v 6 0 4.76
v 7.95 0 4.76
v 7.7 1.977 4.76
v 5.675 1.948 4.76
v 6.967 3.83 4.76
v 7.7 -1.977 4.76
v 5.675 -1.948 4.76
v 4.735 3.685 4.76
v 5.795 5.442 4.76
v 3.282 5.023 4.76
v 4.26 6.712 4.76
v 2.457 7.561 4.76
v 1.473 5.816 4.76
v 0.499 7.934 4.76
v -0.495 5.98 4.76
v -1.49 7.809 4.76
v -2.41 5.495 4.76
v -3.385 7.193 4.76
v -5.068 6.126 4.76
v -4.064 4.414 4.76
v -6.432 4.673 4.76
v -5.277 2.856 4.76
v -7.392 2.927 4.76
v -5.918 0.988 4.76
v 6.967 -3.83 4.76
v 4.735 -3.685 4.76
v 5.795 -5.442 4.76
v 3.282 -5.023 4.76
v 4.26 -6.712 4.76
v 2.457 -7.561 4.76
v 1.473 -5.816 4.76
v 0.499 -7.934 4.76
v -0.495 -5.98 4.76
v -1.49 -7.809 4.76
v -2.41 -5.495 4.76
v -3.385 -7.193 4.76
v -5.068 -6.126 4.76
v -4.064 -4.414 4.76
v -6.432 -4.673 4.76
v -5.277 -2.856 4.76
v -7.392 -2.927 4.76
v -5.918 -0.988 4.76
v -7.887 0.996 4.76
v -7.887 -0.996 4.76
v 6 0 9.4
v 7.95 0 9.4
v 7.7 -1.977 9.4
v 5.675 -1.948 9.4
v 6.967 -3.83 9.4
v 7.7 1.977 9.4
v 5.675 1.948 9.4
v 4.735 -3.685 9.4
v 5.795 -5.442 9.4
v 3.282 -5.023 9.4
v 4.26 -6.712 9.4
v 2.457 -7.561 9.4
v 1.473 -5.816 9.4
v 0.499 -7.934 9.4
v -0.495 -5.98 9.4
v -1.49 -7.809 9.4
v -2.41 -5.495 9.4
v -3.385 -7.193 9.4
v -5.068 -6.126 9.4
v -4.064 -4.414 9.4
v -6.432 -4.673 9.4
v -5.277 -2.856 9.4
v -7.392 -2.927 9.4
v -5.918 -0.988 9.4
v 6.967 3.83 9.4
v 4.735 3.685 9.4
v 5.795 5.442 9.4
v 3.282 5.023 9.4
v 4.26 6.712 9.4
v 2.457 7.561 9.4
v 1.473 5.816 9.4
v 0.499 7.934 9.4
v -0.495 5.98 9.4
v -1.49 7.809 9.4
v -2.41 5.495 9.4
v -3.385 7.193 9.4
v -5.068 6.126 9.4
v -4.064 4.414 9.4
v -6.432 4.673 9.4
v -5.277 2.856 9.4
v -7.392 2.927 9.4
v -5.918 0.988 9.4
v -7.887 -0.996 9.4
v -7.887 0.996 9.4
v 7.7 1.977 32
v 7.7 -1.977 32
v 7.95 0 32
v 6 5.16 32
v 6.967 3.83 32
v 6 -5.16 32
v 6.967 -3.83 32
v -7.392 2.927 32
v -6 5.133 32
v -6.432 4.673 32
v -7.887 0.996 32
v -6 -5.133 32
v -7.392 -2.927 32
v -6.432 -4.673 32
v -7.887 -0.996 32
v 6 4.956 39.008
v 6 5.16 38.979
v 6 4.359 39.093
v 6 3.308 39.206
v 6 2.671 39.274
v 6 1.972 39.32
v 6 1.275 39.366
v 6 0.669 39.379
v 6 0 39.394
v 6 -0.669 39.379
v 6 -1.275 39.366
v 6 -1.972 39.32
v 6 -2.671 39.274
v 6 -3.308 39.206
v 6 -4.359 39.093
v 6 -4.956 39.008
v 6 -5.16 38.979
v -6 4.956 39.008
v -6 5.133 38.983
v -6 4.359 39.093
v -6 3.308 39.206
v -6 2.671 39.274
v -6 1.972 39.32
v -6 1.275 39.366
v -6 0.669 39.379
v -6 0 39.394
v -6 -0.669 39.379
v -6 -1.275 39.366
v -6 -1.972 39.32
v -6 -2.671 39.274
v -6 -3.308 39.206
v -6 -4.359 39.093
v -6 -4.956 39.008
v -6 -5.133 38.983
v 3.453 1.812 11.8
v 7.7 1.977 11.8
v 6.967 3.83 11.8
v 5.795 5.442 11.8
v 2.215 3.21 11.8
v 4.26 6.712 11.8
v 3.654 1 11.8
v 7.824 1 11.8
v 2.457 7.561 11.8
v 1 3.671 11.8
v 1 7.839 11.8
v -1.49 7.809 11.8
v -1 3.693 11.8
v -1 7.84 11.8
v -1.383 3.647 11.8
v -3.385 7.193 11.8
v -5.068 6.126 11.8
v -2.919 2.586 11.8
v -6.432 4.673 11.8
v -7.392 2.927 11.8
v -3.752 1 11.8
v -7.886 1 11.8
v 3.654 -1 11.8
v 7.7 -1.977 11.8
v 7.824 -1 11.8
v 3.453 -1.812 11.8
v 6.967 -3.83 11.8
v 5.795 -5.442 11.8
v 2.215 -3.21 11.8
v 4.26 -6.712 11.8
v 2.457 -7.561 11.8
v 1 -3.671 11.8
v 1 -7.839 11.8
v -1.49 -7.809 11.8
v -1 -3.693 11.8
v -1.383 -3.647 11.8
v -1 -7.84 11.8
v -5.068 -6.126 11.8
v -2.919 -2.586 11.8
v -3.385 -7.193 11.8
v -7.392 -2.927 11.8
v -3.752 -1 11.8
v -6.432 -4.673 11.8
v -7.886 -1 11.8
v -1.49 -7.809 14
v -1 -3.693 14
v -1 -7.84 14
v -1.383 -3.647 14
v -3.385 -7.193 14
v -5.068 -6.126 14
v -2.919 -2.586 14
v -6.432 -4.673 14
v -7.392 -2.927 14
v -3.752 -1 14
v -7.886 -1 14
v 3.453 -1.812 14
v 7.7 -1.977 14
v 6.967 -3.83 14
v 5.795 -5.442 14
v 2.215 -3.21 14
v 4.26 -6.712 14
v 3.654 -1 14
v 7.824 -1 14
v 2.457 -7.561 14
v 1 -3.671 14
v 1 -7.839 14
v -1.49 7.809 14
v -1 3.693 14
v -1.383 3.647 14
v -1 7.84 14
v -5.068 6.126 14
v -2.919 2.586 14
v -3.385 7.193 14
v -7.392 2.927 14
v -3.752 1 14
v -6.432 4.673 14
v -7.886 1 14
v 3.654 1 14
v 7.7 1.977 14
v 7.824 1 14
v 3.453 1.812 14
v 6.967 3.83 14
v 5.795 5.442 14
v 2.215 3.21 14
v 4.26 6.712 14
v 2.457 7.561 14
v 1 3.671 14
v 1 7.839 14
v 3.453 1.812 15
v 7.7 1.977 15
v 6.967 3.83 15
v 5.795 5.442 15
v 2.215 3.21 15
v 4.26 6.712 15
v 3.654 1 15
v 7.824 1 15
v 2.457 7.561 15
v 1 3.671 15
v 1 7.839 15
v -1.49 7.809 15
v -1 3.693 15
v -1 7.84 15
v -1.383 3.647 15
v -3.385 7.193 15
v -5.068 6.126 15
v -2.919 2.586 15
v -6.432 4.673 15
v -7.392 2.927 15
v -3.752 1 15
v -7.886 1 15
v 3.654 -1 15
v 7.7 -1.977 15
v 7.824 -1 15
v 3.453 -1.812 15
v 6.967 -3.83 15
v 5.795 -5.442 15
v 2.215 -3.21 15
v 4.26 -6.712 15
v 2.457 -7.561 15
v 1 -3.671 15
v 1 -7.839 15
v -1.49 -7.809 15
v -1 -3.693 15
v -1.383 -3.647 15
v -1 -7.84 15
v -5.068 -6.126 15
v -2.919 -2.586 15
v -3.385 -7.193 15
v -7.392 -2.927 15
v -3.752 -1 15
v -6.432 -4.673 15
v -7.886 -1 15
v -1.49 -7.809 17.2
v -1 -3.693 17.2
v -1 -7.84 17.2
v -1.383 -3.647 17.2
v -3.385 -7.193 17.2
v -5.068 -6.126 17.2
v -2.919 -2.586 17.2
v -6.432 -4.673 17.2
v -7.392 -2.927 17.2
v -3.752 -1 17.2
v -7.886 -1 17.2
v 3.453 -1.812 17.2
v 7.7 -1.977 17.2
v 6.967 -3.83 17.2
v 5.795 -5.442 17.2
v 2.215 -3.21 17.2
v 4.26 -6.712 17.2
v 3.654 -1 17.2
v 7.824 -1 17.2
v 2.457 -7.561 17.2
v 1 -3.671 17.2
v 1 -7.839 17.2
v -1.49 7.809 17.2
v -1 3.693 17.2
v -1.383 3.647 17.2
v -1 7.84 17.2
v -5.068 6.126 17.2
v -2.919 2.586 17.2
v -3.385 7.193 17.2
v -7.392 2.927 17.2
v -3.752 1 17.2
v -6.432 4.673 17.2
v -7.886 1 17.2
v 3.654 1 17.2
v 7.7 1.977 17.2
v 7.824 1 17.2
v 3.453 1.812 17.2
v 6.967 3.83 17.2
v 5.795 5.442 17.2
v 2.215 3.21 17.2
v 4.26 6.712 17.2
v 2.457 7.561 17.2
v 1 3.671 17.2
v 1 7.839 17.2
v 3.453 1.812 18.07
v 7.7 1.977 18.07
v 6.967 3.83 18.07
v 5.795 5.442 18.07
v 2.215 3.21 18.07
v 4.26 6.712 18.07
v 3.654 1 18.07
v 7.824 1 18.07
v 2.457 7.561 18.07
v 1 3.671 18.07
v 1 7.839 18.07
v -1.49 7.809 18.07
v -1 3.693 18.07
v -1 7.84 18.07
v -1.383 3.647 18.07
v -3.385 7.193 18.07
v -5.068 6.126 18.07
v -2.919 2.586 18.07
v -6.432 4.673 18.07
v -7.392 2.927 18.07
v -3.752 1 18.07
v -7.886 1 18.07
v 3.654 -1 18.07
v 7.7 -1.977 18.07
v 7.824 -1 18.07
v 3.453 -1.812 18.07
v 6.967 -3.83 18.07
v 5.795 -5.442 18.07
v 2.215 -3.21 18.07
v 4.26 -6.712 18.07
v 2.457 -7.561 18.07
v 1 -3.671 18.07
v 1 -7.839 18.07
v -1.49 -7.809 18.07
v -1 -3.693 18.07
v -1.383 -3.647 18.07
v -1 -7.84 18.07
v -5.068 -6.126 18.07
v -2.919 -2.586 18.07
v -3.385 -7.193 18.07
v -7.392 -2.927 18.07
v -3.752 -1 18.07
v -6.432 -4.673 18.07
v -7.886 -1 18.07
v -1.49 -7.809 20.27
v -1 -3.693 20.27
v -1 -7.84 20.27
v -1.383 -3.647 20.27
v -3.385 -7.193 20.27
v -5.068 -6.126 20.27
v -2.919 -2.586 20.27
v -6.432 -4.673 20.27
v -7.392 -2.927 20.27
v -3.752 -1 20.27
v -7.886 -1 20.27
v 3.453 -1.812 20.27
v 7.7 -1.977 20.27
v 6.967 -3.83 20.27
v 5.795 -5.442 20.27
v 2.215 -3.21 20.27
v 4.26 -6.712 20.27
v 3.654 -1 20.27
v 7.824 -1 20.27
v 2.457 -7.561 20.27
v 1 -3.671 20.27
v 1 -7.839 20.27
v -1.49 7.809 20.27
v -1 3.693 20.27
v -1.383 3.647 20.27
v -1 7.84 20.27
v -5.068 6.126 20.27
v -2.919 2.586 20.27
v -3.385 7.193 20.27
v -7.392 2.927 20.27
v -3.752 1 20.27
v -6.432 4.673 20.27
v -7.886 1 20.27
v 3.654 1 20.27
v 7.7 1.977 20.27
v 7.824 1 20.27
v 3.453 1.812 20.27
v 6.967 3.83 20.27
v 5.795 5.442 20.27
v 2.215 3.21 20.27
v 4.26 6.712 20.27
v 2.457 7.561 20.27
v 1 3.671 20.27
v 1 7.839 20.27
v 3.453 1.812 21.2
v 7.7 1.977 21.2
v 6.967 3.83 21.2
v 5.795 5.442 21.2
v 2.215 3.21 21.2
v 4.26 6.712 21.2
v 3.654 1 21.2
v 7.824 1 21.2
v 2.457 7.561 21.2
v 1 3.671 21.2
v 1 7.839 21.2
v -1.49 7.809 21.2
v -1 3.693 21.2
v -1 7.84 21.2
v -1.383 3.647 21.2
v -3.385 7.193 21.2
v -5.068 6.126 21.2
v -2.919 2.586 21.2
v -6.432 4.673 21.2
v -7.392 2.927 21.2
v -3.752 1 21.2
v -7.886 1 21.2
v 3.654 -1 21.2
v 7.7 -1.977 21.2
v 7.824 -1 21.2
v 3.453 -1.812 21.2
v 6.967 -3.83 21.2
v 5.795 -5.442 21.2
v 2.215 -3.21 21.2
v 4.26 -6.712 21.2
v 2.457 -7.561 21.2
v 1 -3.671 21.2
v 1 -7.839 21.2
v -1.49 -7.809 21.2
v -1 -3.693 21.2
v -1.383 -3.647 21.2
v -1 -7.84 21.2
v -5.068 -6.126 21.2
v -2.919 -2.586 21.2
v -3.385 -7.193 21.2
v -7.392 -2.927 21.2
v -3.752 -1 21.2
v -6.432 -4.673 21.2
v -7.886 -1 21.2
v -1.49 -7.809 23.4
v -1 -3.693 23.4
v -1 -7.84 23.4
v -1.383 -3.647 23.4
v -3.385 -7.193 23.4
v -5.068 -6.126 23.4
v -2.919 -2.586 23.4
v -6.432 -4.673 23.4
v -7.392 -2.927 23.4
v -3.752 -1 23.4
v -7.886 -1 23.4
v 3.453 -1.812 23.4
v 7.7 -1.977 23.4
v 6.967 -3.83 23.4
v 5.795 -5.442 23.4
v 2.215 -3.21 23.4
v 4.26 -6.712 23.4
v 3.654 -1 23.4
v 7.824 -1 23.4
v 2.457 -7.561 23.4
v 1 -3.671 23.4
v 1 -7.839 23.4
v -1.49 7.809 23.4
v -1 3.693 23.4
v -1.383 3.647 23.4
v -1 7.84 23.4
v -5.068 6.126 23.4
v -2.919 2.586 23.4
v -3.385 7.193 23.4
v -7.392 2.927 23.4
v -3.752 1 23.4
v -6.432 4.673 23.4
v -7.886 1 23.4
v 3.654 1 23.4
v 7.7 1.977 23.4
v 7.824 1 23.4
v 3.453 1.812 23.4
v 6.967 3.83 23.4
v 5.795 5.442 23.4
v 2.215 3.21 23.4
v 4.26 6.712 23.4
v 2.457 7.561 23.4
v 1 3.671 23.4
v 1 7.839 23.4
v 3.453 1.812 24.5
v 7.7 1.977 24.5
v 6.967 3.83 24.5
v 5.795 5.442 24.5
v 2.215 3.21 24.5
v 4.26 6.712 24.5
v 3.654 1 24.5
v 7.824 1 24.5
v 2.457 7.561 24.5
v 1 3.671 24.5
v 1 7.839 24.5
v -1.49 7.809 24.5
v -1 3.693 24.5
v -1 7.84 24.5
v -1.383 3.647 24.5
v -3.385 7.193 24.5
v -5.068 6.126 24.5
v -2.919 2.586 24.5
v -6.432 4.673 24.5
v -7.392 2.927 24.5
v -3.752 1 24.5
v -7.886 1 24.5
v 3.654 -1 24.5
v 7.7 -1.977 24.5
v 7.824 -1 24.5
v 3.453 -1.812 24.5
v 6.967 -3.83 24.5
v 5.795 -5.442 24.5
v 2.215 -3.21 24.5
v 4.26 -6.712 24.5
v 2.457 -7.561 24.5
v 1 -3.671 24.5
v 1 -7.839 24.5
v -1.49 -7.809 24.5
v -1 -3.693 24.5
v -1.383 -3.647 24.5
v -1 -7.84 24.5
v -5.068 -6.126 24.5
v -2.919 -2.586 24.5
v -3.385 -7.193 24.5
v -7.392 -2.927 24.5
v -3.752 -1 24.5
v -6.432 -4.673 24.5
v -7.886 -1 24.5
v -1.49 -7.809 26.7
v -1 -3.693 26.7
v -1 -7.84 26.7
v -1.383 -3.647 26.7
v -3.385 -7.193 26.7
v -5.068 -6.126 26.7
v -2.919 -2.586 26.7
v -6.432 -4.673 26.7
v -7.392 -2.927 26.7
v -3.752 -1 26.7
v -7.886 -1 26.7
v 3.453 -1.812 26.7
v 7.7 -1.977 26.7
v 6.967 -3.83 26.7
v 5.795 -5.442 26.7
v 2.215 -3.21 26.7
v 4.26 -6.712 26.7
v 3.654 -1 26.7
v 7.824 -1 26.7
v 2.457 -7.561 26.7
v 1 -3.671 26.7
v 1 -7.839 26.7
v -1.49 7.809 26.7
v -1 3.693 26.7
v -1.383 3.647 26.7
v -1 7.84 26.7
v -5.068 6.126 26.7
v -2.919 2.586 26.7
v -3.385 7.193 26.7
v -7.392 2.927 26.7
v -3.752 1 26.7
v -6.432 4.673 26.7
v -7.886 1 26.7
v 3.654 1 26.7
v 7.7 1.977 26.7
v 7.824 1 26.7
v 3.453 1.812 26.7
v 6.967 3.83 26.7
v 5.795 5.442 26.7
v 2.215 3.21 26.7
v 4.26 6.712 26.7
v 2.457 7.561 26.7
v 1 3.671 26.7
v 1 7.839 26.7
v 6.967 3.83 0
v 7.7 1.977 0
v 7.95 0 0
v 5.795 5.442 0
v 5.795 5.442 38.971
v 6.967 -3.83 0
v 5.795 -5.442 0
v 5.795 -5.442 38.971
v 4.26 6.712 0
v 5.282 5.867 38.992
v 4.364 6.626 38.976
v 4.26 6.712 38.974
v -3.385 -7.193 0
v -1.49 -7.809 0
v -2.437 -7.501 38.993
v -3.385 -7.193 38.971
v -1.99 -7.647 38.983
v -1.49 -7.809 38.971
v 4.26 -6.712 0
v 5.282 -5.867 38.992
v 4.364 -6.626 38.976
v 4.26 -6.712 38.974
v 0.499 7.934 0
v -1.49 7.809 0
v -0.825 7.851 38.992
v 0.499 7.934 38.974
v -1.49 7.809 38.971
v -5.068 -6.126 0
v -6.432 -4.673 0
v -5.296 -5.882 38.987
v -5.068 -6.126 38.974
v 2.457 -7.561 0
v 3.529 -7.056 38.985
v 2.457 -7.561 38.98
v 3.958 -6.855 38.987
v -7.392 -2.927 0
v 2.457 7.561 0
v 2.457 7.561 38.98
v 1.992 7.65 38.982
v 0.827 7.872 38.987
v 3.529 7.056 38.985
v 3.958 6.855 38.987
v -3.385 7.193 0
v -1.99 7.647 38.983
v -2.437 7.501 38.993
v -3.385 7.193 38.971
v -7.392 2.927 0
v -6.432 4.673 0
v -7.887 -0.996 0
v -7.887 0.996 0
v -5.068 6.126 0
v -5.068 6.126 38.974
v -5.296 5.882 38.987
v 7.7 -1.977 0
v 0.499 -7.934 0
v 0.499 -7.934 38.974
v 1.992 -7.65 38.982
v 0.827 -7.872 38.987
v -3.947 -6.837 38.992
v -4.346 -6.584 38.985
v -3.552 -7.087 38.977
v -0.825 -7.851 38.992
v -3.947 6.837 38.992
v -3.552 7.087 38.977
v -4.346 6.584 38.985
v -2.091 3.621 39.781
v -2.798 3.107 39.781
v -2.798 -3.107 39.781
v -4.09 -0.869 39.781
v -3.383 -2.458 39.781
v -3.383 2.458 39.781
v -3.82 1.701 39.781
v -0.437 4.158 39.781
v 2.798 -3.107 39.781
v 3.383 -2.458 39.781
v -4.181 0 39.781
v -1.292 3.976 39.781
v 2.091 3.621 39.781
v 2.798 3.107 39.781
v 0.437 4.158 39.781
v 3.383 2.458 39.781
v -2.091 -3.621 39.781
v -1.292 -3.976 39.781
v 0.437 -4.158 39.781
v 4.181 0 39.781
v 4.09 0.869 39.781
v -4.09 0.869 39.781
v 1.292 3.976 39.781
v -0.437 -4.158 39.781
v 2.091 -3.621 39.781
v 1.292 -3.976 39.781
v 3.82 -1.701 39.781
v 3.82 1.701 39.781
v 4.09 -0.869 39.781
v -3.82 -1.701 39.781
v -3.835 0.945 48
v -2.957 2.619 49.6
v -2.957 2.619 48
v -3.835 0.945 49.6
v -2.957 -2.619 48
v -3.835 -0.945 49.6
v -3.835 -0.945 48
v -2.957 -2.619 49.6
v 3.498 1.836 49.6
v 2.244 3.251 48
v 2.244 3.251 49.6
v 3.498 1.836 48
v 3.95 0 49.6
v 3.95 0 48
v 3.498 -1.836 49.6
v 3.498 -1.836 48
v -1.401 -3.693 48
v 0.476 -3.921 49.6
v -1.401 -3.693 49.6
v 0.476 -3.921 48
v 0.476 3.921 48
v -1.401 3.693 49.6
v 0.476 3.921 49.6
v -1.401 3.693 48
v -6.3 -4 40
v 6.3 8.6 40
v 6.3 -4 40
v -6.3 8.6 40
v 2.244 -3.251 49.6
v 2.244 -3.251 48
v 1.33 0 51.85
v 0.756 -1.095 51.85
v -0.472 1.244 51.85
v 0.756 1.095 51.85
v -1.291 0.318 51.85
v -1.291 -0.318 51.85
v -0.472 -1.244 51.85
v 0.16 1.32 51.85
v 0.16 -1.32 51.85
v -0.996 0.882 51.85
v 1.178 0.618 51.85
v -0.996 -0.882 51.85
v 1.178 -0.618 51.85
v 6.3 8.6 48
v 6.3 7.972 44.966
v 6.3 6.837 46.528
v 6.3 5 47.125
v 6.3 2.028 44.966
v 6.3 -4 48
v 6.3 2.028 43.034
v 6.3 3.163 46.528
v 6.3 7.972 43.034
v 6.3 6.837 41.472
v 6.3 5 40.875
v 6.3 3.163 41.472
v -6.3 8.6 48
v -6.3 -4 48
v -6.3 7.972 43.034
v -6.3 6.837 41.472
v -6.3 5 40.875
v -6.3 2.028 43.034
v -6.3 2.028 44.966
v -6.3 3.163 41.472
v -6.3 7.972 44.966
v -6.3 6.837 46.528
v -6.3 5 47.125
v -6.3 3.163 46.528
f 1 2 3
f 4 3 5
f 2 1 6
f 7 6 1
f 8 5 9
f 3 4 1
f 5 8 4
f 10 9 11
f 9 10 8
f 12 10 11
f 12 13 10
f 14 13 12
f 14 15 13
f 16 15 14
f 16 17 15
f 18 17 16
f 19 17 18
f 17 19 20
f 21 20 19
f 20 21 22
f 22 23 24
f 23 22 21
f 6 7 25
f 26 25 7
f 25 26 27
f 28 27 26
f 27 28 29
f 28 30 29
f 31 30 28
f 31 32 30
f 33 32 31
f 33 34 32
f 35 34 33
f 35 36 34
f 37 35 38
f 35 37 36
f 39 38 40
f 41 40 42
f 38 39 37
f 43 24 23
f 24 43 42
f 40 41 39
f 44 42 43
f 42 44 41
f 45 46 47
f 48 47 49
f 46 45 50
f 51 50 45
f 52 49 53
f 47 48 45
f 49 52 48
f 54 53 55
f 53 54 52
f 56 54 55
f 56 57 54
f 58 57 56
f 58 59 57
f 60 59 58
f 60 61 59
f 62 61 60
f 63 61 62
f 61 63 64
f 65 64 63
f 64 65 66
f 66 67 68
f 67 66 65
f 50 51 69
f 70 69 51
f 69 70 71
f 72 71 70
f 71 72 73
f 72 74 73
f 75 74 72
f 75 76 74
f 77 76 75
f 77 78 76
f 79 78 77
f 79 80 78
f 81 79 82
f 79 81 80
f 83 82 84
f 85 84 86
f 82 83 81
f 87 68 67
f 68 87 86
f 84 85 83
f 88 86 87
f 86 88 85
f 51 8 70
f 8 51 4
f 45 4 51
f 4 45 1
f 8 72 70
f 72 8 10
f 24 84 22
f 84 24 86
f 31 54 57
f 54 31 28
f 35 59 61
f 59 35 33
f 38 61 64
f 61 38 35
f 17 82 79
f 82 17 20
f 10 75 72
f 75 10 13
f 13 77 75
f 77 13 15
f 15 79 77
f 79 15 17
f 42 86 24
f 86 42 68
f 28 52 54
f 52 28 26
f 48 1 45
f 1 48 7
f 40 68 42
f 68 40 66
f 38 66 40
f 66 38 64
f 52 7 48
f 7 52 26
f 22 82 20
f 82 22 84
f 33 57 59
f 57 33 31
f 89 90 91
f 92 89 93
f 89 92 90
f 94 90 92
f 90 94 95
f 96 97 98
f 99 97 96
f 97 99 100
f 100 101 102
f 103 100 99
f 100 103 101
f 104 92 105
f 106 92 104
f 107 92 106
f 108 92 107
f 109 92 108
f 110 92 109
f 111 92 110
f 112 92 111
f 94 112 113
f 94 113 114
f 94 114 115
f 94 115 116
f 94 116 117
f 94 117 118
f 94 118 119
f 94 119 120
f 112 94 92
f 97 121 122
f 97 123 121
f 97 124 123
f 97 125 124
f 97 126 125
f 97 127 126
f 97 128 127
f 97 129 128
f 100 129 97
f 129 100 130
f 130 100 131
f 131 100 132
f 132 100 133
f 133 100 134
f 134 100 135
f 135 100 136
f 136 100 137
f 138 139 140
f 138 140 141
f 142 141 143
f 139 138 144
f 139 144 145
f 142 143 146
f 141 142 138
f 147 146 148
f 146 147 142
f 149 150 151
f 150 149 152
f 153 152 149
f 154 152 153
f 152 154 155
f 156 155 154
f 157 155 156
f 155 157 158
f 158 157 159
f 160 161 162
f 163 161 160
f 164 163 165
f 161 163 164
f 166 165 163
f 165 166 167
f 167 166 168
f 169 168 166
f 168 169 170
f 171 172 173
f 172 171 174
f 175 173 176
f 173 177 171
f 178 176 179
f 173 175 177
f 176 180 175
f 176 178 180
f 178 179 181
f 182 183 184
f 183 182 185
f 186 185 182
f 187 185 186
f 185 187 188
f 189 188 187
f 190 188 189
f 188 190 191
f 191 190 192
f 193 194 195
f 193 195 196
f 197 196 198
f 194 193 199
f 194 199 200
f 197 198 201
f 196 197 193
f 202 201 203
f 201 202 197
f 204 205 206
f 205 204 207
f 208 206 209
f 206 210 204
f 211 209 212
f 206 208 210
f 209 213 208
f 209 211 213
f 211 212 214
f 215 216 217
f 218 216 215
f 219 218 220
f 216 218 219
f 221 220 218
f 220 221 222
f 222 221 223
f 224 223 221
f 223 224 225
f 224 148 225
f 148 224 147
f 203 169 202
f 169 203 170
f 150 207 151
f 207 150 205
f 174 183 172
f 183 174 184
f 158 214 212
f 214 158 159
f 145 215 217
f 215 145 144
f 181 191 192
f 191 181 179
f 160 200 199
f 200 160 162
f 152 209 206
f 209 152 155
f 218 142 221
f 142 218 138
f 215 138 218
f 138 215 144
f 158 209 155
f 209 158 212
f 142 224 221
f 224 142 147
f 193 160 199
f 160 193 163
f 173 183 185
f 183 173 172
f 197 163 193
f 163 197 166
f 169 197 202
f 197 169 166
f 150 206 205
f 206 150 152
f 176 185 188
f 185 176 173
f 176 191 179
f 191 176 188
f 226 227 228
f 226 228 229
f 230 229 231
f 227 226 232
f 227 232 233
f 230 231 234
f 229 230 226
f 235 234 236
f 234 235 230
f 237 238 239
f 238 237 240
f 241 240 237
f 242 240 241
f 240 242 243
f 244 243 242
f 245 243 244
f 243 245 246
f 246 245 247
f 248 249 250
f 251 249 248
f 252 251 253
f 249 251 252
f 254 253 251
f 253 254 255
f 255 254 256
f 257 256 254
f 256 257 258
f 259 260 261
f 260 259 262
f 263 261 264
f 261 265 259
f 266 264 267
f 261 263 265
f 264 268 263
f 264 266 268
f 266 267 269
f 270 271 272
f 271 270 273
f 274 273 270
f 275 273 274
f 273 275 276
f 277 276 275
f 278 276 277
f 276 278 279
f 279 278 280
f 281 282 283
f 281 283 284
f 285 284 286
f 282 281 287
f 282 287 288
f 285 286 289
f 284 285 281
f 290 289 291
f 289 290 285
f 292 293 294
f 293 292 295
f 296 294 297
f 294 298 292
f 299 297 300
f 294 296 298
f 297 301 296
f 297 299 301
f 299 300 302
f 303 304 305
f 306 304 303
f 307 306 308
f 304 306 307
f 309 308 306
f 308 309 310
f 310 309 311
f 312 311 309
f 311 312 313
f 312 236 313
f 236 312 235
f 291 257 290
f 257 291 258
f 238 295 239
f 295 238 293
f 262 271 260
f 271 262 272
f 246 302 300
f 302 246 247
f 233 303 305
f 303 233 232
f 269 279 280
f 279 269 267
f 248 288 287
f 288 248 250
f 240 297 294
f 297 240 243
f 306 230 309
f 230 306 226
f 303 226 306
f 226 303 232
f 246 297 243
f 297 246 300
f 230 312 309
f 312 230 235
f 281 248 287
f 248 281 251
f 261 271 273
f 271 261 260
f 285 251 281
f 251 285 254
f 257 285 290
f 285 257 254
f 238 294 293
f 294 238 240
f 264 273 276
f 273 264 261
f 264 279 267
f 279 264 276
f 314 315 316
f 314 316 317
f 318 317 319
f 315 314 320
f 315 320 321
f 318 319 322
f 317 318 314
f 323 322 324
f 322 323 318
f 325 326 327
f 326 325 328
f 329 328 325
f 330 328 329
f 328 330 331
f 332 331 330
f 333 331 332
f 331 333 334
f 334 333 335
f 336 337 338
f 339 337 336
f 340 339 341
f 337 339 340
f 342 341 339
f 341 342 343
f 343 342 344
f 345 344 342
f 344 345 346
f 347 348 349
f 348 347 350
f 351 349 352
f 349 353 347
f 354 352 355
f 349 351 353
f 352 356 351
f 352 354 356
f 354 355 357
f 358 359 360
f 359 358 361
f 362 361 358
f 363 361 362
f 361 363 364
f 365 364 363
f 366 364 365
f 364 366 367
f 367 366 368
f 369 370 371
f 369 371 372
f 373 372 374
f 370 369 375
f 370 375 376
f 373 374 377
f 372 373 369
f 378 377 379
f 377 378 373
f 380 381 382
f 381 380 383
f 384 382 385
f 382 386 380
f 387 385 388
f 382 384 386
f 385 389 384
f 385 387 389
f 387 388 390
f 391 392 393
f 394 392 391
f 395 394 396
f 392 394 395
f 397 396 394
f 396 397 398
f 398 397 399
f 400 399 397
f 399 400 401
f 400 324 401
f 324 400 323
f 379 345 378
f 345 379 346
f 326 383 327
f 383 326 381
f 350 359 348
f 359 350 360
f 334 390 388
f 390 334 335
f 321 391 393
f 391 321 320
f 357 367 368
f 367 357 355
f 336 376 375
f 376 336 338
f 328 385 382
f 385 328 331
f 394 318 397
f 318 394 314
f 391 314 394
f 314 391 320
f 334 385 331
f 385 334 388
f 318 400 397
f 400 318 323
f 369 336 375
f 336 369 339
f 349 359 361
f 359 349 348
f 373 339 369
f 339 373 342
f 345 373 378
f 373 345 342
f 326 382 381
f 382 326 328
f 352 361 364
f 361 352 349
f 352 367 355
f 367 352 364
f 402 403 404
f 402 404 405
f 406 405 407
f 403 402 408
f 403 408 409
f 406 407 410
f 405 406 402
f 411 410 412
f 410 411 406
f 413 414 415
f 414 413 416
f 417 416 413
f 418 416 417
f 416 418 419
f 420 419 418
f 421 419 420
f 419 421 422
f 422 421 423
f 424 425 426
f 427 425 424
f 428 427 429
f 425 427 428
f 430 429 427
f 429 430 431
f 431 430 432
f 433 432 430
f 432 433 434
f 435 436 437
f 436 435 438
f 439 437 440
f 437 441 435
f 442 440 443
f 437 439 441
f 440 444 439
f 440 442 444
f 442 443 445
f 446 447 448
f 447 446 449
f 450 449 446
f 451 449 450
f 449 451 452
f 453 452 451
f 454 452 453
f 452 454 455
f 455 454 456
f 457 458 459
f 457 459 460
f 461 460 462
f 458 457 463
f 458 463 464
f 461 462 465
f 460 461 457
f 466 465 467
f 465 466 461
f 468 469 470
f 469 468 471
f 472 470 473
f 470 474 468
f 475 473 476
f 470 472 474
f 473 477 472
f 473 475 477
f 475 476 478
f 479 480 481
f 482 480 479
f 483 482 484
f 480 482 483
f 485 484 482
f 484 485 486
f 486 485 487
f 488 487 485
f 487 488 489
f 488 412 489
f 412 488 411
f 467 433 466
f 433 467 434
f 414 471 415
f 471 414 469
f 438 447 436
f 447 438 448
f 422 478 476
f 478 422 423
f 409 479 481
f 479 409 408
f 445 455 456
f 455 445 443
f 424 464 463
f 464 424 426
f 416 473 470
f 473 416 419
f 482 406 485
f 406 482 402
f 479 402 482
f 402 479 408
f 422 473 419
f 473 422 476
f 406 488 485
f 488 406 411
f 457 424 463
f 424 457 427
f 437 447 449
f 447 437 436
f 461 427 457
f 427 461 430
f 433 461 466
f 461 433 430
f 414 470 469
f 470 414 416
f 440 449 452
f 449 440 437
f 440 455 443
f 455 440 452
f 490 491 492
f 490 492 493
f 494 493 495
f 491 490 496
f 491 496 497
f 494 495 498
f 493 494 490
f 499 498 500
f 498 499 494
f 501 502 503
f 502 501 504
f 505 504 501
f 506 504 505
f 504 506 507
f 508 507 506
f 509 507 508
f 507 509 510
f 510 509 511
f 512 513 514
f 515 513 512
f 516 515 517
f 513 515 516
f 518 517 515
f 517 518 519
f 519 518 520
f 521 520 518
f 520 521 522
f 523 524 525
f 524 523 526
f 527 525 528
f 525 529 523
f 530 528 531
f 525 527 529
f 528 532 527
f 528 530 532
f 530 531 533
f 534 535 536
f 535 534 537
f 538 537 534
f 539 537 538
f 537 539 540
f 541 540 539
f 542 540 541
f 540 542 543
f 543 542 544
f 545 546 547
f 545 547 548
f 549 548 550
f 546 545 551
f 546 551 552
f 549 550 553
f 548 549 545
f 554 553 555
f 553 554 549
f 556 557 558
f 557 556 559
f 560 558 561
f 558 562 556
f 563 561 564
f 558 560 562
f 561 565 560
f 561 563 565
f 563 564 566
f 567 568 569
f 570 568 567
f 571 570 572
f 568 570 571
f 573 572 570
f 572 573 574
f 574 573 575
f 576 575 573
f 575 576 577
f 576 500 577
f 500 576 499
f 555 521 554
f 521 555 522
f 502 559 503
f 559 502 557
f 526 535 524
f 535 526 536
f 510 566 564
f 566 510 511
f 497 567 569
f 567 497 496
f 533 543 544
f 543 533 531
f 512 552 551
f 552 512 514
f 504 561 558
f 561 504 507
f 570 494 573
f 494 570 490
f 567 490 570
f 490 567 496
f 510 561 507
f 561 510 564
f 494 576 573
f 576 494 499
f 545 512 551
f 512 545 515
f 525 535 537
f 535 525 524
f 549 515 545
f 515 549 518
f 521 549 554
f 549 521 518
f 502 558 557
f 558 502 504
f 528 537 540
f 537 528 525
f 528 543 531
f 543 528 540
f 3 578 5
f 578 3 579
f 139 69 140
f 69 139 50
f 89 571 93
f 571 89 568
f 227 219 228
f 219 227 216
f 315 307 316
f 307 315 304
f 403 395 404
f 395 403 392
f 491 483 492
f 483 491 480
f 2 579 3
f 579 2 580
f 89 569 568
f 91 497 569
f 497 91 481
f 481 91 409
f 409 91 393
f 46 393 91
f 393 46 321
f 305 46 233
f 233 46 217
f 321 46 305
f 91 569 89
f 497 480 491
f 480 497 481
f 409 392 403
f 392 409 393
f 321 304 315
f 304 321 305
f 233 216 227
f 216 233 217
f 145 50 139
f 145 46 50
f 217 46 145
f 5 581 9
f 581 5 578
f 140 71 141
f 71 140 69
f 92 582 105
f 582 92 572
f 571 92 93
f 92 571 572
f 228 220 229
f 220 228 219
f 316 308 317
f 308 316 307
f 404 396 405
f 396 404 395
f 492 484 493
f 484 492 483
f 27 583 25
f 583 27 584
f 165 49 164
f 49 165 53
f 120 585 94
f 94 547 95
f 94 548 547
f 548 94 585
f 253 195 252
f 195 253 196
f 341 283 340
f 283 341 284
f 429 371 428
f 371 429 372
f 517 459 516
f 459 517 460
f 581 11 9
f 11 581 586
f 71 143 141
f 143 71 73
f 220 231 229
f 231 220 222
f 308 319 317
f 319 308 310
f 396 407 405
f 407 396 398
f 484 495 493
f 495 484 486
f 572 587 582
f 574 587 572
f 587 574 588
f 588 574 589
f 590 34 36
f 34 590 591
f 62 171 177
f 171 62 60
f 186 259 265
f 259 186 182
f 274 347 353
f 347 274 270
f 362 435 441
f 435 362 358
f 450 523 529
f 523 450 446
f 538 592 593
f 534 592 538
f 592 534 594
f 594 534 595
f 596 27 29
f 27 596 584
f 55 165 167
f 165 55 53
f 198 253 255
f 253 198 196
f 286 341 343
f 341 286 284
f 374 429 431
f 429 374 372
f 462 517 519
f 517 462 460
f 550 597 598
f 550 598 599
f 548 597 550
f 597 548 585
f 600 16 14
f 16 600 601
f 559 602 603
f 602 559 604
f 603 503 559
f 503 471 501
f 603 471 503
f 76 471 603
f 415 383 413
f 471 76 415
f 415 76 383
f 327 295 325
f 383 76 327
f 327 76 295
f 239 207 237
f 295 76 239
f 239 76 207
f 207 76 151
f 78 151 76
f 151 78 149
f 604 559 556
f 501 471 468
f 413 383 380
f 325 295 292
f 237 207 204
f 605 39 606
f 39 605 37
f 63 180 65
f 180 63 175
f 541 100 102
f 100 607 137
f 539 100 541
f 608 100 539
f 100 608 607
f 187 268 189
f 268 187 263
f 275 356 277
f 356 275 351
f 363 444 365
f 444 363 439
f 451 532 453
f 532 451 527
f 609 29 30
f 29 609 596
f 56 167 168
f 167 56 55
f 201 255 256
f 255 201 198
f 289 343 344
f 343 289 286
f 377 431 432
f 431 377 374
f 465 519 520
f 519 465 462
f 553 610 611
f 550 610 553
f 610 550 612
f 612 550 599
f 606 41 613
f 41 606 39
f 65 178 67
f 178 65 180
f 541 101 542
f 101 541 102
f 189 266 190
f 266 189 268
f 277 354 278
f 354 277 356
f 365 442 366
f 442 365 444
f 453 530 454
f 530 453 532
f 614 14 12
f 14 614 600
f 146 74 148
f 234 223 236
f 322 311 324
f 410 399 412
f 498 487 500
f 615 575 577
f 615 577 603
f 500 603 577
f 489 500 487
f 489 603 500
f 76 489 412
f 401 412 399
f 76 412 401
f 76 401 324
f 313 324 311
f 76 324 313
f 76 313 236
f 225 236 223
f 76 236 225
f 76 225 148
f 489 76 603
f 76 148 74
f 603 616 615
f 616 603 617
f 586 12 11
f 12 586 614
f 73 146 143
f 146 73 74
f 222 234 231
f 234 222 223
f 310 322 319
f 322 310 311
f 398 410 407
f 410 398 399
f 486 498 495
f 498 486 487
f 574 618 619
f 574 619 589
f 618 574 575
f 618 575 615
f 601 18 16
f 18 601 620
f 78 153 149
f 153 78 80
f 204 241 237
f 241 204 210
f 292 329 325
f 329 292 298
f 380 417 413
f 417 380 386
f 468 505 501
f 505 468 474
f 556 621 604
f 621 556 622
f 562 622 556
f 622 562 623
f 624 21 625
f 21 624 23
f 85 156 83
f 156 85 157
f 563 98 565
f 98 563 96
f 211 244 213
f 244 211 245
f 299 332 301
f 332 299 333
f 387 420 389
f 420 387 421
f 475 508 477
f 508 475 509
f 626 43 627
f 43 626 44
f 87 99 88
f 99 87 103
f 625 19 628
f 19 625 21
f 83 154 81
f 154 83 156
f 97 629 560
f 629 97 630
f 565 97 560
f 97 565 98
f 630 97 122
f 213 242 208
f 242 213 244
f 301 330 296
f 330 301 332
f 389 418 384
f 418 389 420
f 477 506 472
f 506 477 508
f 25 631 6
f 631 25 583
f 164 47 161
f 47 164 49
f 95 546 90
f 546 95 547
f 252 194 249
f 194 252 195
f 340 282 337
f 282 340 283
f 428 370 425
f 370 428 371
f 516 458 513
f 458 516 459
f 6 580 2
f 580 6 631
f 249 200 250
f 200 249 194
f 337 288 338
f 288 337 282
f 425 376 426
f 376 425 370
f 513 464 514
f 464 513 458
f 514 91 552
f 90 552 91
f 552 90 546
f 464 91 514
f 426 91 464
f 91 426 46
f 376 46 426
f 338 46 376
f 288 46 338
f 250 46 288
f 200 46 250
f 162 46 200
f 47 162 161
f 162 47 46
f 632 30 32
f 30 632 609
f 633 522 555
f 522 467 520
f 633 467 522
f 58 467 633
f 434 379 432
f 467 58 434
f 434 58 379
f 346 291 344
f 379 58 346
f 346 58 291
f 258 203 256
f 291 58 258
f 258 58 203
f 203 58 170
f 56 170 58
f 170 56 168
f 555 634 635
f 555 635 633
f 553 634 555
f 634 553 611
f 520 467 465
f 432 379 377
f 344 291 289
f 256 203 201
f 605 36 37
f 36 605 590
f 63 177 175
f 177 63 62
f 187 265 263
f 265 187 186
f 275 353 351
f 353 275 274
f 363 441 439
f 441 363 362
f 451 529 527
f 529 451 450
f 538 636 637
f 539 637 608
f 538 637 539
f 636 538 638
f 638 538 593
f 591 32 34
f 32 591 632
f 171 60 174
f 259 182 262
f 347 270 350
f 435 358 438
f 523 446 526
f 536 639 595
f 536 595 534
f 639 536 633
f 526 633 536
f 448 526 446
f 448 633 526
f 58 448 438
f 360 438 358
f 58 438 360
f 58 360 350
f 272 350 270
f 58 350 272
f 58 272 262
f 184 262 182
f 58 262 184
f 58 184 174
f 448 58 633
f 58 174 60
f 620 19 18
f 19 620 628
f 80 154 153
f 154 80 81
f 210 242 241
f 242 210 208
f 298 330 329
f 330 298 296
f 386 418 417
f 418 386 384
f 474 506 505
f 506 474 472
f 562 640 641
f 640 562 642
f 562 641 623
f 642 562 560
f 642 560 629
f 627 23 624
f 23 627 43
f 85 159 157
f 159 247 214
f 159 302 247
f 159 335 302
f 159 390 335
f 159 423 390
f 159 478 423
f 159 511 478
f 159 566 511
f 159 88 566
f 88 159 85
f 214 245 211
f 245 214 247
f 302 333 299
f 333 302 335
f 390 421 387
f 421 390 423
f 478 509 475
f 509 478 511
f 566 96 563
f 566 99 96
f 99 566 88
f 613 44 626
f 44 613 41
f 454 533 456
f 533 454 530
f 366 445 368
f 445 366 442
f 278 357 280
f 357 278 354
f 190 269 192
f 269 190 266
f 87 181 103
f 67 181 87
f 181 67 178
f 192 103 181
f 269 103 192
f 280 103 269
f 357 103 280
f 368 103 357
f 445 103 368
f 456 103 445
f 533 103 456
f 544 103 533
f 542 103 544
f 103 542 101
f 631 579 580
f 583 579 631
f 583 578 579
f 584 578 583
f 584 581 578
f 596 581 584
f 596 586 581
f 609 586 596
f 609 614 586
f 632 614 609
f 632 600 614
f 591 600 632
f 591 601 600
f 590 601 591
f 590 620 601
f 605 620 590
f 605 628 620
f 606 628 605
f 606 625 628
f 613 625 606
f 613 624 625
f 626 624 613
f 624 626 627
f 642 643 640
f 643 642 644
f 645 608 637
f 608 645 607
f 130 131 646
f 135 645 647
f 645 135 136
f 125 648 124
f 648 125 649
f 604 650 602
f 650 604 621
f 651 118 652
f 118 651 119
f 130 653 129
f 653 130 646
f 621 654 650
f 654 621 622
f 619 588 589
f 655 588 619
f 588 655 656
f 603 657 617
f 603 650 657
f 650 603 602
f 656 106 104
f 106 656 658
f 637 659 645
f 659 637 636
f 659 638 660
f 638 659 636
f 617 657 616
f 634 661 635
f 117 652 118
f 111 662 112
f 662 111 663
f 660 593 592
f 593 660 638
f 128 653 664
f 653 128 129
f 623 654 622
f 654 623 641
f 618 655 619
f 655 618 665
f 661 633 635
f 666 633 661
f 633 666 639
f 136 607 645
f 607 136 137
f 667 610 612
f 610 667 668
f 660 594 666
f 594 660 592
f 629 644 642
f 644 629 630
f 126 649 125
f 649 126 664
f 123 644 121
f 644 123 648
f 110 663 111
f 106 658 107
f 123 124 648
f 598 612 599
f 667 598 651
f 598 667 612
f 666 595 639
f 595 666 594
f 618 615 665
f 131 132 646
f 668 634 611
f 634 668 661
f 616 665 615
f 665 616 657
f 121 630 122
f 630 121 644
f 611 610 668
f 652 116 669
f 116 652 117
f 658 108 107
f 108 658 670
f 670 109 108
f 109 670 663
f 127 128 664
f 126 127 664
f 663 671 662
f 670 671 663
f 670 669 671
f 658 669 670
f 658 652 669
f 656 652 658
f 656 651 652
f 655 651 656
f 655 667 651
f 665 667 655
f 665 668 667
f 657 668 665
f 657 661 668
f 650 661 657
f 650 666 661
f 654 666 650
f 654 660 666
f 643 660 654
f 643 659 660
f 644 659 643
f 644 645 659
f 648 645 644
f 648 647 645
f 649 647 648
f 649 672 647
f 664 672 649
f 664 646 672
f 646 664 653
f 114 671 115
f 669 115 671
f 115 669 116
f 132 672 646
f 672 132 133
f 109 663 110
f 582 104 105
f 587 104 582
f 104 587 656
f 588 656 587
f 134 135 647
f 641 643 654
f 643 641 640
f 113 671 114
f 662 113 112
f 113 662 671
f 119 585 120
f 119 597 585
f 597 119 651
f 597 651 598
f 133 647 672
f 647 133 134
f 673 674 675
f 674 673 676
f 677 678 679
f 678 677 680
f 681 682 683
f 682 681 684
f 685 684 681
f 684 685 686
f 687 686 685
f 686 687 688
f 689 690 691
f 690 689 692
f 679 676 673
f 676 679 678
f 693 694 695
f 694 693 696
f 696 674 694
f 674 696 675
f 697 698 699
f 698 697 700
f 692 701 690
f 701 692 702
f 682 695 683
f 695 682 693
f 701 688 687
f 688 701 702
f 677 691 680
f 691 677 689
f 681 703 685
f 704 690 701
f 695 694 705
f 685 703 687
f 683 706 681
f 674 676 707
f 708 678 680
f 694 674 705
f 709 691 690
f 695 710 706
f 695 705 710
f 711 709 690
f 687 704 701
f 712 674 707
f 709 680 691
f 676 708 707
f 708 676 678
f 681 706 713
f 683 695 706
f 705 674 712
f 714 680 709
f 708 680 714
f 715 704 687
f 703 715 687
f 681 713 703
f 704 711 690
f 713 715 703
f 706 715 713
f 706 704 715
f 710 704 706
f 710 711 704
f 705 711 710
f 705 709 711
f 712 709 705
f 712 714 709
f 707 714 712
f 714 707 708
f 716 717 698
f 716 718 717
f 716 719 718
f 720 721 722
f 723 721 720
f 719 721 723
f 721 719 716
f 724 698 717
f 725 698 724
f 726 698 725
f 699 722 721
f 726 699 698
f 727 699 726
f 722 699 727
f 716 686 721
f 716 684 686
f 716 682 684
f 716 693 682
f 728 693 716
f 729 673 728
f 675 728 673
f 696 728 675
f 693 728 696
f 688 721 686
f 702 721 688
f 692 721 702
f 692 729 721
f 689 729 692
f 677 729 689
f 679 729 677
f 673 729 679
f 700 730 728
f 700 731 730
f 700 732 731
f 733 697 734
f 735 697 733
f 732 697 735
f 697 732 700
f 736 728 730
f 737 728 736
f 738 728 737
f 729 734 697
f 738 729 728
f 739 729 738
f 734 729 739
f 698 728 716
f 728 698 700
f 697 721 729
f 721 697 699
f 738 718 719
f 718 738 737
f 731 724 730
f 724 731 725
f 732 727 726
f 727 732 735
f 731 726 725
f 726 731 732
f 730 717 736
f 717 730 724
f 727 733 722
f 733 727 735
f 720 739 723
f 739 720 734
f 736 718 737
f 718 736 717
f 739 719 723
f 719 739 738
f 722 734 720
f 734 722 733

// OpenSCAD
hotend_jhead();

// width of the hotend mount
jhead_mount_width=15.9;
// width of the grooved area
jhead_groove_width=12;
jhead_mount_height_array=[4.76, 4.64];

module hotend_jhead() {
	translate([0,0,0])  jhead_plastic_body();
	translate([0,0,40]) jhead_brass_nozzle();
}

module jhead_plastic_body() {
	intersection() {
	difference() {
		cylinder(h=40,d=jhead_mount_width);
		translate([0,0,4.76]) jhead_groovemount_cutout();
	
		// add the wrench flats
		translate([0,0,32]) jhead_wrench_cutout();
		
		// add (crappy) cooling grooves
		translate([0,0,11.80]) jhead_cooling_cutout();
		translate([0,0,15.00]) jhead_cooling_cutout();
		translate([0,0,18.07]) jhead_cooling_cutout();
		translate([0,0,21.20]) jhead_cooling_cutout();
		translate([0,0,24.50]) jhead_cooling_cutout();
	}
	// get the rounded bit at the end
	sphere(r=40);
	}
}

module jhead_groovemount_cutout() {
	difference() {
		cylinder(h=4.64,r=10);
		cylinder(h=4.64,r=6);
	}
}

module jhead_wrench_cutout() {
	difference() {
		translate([-10,-10,0]) cube([20,20,8]);
		translate([-6,-10,0])  cube([12,20,8]);
	}
}

module jhead_cooling_cutout() {
	render() difference() {
		difference() {
			cylinder(h=2.20,r=10);		
			translate([-1,-10,0]) cube([2,20,2.2]);
			translate([-10,-1,0]) cube([20,2,2.2]);
		}
		cylinder(h=2.20,r=3.9);
	}
}

module jhead_brass_nozzle() { 
	// heater body 12.65 x 12.65 x 8
	//
	//
	difference() {
	union() {
	// draw the cylinder and cap it with the nozzle
	translate([0,0,0])     cylinder(h=9.60, r=3.95);
	translate([0,0,9.6])   cylinder(h=2.25, r1=3.95, r2=1.33);
	translate([-6.3,-4,0]) cube([12.6,12.6,8]);
	}
	translate([6.4,5,4]) rotate([0,270,0]) cylinder(h=12.8,r=3.125);
	}
}
